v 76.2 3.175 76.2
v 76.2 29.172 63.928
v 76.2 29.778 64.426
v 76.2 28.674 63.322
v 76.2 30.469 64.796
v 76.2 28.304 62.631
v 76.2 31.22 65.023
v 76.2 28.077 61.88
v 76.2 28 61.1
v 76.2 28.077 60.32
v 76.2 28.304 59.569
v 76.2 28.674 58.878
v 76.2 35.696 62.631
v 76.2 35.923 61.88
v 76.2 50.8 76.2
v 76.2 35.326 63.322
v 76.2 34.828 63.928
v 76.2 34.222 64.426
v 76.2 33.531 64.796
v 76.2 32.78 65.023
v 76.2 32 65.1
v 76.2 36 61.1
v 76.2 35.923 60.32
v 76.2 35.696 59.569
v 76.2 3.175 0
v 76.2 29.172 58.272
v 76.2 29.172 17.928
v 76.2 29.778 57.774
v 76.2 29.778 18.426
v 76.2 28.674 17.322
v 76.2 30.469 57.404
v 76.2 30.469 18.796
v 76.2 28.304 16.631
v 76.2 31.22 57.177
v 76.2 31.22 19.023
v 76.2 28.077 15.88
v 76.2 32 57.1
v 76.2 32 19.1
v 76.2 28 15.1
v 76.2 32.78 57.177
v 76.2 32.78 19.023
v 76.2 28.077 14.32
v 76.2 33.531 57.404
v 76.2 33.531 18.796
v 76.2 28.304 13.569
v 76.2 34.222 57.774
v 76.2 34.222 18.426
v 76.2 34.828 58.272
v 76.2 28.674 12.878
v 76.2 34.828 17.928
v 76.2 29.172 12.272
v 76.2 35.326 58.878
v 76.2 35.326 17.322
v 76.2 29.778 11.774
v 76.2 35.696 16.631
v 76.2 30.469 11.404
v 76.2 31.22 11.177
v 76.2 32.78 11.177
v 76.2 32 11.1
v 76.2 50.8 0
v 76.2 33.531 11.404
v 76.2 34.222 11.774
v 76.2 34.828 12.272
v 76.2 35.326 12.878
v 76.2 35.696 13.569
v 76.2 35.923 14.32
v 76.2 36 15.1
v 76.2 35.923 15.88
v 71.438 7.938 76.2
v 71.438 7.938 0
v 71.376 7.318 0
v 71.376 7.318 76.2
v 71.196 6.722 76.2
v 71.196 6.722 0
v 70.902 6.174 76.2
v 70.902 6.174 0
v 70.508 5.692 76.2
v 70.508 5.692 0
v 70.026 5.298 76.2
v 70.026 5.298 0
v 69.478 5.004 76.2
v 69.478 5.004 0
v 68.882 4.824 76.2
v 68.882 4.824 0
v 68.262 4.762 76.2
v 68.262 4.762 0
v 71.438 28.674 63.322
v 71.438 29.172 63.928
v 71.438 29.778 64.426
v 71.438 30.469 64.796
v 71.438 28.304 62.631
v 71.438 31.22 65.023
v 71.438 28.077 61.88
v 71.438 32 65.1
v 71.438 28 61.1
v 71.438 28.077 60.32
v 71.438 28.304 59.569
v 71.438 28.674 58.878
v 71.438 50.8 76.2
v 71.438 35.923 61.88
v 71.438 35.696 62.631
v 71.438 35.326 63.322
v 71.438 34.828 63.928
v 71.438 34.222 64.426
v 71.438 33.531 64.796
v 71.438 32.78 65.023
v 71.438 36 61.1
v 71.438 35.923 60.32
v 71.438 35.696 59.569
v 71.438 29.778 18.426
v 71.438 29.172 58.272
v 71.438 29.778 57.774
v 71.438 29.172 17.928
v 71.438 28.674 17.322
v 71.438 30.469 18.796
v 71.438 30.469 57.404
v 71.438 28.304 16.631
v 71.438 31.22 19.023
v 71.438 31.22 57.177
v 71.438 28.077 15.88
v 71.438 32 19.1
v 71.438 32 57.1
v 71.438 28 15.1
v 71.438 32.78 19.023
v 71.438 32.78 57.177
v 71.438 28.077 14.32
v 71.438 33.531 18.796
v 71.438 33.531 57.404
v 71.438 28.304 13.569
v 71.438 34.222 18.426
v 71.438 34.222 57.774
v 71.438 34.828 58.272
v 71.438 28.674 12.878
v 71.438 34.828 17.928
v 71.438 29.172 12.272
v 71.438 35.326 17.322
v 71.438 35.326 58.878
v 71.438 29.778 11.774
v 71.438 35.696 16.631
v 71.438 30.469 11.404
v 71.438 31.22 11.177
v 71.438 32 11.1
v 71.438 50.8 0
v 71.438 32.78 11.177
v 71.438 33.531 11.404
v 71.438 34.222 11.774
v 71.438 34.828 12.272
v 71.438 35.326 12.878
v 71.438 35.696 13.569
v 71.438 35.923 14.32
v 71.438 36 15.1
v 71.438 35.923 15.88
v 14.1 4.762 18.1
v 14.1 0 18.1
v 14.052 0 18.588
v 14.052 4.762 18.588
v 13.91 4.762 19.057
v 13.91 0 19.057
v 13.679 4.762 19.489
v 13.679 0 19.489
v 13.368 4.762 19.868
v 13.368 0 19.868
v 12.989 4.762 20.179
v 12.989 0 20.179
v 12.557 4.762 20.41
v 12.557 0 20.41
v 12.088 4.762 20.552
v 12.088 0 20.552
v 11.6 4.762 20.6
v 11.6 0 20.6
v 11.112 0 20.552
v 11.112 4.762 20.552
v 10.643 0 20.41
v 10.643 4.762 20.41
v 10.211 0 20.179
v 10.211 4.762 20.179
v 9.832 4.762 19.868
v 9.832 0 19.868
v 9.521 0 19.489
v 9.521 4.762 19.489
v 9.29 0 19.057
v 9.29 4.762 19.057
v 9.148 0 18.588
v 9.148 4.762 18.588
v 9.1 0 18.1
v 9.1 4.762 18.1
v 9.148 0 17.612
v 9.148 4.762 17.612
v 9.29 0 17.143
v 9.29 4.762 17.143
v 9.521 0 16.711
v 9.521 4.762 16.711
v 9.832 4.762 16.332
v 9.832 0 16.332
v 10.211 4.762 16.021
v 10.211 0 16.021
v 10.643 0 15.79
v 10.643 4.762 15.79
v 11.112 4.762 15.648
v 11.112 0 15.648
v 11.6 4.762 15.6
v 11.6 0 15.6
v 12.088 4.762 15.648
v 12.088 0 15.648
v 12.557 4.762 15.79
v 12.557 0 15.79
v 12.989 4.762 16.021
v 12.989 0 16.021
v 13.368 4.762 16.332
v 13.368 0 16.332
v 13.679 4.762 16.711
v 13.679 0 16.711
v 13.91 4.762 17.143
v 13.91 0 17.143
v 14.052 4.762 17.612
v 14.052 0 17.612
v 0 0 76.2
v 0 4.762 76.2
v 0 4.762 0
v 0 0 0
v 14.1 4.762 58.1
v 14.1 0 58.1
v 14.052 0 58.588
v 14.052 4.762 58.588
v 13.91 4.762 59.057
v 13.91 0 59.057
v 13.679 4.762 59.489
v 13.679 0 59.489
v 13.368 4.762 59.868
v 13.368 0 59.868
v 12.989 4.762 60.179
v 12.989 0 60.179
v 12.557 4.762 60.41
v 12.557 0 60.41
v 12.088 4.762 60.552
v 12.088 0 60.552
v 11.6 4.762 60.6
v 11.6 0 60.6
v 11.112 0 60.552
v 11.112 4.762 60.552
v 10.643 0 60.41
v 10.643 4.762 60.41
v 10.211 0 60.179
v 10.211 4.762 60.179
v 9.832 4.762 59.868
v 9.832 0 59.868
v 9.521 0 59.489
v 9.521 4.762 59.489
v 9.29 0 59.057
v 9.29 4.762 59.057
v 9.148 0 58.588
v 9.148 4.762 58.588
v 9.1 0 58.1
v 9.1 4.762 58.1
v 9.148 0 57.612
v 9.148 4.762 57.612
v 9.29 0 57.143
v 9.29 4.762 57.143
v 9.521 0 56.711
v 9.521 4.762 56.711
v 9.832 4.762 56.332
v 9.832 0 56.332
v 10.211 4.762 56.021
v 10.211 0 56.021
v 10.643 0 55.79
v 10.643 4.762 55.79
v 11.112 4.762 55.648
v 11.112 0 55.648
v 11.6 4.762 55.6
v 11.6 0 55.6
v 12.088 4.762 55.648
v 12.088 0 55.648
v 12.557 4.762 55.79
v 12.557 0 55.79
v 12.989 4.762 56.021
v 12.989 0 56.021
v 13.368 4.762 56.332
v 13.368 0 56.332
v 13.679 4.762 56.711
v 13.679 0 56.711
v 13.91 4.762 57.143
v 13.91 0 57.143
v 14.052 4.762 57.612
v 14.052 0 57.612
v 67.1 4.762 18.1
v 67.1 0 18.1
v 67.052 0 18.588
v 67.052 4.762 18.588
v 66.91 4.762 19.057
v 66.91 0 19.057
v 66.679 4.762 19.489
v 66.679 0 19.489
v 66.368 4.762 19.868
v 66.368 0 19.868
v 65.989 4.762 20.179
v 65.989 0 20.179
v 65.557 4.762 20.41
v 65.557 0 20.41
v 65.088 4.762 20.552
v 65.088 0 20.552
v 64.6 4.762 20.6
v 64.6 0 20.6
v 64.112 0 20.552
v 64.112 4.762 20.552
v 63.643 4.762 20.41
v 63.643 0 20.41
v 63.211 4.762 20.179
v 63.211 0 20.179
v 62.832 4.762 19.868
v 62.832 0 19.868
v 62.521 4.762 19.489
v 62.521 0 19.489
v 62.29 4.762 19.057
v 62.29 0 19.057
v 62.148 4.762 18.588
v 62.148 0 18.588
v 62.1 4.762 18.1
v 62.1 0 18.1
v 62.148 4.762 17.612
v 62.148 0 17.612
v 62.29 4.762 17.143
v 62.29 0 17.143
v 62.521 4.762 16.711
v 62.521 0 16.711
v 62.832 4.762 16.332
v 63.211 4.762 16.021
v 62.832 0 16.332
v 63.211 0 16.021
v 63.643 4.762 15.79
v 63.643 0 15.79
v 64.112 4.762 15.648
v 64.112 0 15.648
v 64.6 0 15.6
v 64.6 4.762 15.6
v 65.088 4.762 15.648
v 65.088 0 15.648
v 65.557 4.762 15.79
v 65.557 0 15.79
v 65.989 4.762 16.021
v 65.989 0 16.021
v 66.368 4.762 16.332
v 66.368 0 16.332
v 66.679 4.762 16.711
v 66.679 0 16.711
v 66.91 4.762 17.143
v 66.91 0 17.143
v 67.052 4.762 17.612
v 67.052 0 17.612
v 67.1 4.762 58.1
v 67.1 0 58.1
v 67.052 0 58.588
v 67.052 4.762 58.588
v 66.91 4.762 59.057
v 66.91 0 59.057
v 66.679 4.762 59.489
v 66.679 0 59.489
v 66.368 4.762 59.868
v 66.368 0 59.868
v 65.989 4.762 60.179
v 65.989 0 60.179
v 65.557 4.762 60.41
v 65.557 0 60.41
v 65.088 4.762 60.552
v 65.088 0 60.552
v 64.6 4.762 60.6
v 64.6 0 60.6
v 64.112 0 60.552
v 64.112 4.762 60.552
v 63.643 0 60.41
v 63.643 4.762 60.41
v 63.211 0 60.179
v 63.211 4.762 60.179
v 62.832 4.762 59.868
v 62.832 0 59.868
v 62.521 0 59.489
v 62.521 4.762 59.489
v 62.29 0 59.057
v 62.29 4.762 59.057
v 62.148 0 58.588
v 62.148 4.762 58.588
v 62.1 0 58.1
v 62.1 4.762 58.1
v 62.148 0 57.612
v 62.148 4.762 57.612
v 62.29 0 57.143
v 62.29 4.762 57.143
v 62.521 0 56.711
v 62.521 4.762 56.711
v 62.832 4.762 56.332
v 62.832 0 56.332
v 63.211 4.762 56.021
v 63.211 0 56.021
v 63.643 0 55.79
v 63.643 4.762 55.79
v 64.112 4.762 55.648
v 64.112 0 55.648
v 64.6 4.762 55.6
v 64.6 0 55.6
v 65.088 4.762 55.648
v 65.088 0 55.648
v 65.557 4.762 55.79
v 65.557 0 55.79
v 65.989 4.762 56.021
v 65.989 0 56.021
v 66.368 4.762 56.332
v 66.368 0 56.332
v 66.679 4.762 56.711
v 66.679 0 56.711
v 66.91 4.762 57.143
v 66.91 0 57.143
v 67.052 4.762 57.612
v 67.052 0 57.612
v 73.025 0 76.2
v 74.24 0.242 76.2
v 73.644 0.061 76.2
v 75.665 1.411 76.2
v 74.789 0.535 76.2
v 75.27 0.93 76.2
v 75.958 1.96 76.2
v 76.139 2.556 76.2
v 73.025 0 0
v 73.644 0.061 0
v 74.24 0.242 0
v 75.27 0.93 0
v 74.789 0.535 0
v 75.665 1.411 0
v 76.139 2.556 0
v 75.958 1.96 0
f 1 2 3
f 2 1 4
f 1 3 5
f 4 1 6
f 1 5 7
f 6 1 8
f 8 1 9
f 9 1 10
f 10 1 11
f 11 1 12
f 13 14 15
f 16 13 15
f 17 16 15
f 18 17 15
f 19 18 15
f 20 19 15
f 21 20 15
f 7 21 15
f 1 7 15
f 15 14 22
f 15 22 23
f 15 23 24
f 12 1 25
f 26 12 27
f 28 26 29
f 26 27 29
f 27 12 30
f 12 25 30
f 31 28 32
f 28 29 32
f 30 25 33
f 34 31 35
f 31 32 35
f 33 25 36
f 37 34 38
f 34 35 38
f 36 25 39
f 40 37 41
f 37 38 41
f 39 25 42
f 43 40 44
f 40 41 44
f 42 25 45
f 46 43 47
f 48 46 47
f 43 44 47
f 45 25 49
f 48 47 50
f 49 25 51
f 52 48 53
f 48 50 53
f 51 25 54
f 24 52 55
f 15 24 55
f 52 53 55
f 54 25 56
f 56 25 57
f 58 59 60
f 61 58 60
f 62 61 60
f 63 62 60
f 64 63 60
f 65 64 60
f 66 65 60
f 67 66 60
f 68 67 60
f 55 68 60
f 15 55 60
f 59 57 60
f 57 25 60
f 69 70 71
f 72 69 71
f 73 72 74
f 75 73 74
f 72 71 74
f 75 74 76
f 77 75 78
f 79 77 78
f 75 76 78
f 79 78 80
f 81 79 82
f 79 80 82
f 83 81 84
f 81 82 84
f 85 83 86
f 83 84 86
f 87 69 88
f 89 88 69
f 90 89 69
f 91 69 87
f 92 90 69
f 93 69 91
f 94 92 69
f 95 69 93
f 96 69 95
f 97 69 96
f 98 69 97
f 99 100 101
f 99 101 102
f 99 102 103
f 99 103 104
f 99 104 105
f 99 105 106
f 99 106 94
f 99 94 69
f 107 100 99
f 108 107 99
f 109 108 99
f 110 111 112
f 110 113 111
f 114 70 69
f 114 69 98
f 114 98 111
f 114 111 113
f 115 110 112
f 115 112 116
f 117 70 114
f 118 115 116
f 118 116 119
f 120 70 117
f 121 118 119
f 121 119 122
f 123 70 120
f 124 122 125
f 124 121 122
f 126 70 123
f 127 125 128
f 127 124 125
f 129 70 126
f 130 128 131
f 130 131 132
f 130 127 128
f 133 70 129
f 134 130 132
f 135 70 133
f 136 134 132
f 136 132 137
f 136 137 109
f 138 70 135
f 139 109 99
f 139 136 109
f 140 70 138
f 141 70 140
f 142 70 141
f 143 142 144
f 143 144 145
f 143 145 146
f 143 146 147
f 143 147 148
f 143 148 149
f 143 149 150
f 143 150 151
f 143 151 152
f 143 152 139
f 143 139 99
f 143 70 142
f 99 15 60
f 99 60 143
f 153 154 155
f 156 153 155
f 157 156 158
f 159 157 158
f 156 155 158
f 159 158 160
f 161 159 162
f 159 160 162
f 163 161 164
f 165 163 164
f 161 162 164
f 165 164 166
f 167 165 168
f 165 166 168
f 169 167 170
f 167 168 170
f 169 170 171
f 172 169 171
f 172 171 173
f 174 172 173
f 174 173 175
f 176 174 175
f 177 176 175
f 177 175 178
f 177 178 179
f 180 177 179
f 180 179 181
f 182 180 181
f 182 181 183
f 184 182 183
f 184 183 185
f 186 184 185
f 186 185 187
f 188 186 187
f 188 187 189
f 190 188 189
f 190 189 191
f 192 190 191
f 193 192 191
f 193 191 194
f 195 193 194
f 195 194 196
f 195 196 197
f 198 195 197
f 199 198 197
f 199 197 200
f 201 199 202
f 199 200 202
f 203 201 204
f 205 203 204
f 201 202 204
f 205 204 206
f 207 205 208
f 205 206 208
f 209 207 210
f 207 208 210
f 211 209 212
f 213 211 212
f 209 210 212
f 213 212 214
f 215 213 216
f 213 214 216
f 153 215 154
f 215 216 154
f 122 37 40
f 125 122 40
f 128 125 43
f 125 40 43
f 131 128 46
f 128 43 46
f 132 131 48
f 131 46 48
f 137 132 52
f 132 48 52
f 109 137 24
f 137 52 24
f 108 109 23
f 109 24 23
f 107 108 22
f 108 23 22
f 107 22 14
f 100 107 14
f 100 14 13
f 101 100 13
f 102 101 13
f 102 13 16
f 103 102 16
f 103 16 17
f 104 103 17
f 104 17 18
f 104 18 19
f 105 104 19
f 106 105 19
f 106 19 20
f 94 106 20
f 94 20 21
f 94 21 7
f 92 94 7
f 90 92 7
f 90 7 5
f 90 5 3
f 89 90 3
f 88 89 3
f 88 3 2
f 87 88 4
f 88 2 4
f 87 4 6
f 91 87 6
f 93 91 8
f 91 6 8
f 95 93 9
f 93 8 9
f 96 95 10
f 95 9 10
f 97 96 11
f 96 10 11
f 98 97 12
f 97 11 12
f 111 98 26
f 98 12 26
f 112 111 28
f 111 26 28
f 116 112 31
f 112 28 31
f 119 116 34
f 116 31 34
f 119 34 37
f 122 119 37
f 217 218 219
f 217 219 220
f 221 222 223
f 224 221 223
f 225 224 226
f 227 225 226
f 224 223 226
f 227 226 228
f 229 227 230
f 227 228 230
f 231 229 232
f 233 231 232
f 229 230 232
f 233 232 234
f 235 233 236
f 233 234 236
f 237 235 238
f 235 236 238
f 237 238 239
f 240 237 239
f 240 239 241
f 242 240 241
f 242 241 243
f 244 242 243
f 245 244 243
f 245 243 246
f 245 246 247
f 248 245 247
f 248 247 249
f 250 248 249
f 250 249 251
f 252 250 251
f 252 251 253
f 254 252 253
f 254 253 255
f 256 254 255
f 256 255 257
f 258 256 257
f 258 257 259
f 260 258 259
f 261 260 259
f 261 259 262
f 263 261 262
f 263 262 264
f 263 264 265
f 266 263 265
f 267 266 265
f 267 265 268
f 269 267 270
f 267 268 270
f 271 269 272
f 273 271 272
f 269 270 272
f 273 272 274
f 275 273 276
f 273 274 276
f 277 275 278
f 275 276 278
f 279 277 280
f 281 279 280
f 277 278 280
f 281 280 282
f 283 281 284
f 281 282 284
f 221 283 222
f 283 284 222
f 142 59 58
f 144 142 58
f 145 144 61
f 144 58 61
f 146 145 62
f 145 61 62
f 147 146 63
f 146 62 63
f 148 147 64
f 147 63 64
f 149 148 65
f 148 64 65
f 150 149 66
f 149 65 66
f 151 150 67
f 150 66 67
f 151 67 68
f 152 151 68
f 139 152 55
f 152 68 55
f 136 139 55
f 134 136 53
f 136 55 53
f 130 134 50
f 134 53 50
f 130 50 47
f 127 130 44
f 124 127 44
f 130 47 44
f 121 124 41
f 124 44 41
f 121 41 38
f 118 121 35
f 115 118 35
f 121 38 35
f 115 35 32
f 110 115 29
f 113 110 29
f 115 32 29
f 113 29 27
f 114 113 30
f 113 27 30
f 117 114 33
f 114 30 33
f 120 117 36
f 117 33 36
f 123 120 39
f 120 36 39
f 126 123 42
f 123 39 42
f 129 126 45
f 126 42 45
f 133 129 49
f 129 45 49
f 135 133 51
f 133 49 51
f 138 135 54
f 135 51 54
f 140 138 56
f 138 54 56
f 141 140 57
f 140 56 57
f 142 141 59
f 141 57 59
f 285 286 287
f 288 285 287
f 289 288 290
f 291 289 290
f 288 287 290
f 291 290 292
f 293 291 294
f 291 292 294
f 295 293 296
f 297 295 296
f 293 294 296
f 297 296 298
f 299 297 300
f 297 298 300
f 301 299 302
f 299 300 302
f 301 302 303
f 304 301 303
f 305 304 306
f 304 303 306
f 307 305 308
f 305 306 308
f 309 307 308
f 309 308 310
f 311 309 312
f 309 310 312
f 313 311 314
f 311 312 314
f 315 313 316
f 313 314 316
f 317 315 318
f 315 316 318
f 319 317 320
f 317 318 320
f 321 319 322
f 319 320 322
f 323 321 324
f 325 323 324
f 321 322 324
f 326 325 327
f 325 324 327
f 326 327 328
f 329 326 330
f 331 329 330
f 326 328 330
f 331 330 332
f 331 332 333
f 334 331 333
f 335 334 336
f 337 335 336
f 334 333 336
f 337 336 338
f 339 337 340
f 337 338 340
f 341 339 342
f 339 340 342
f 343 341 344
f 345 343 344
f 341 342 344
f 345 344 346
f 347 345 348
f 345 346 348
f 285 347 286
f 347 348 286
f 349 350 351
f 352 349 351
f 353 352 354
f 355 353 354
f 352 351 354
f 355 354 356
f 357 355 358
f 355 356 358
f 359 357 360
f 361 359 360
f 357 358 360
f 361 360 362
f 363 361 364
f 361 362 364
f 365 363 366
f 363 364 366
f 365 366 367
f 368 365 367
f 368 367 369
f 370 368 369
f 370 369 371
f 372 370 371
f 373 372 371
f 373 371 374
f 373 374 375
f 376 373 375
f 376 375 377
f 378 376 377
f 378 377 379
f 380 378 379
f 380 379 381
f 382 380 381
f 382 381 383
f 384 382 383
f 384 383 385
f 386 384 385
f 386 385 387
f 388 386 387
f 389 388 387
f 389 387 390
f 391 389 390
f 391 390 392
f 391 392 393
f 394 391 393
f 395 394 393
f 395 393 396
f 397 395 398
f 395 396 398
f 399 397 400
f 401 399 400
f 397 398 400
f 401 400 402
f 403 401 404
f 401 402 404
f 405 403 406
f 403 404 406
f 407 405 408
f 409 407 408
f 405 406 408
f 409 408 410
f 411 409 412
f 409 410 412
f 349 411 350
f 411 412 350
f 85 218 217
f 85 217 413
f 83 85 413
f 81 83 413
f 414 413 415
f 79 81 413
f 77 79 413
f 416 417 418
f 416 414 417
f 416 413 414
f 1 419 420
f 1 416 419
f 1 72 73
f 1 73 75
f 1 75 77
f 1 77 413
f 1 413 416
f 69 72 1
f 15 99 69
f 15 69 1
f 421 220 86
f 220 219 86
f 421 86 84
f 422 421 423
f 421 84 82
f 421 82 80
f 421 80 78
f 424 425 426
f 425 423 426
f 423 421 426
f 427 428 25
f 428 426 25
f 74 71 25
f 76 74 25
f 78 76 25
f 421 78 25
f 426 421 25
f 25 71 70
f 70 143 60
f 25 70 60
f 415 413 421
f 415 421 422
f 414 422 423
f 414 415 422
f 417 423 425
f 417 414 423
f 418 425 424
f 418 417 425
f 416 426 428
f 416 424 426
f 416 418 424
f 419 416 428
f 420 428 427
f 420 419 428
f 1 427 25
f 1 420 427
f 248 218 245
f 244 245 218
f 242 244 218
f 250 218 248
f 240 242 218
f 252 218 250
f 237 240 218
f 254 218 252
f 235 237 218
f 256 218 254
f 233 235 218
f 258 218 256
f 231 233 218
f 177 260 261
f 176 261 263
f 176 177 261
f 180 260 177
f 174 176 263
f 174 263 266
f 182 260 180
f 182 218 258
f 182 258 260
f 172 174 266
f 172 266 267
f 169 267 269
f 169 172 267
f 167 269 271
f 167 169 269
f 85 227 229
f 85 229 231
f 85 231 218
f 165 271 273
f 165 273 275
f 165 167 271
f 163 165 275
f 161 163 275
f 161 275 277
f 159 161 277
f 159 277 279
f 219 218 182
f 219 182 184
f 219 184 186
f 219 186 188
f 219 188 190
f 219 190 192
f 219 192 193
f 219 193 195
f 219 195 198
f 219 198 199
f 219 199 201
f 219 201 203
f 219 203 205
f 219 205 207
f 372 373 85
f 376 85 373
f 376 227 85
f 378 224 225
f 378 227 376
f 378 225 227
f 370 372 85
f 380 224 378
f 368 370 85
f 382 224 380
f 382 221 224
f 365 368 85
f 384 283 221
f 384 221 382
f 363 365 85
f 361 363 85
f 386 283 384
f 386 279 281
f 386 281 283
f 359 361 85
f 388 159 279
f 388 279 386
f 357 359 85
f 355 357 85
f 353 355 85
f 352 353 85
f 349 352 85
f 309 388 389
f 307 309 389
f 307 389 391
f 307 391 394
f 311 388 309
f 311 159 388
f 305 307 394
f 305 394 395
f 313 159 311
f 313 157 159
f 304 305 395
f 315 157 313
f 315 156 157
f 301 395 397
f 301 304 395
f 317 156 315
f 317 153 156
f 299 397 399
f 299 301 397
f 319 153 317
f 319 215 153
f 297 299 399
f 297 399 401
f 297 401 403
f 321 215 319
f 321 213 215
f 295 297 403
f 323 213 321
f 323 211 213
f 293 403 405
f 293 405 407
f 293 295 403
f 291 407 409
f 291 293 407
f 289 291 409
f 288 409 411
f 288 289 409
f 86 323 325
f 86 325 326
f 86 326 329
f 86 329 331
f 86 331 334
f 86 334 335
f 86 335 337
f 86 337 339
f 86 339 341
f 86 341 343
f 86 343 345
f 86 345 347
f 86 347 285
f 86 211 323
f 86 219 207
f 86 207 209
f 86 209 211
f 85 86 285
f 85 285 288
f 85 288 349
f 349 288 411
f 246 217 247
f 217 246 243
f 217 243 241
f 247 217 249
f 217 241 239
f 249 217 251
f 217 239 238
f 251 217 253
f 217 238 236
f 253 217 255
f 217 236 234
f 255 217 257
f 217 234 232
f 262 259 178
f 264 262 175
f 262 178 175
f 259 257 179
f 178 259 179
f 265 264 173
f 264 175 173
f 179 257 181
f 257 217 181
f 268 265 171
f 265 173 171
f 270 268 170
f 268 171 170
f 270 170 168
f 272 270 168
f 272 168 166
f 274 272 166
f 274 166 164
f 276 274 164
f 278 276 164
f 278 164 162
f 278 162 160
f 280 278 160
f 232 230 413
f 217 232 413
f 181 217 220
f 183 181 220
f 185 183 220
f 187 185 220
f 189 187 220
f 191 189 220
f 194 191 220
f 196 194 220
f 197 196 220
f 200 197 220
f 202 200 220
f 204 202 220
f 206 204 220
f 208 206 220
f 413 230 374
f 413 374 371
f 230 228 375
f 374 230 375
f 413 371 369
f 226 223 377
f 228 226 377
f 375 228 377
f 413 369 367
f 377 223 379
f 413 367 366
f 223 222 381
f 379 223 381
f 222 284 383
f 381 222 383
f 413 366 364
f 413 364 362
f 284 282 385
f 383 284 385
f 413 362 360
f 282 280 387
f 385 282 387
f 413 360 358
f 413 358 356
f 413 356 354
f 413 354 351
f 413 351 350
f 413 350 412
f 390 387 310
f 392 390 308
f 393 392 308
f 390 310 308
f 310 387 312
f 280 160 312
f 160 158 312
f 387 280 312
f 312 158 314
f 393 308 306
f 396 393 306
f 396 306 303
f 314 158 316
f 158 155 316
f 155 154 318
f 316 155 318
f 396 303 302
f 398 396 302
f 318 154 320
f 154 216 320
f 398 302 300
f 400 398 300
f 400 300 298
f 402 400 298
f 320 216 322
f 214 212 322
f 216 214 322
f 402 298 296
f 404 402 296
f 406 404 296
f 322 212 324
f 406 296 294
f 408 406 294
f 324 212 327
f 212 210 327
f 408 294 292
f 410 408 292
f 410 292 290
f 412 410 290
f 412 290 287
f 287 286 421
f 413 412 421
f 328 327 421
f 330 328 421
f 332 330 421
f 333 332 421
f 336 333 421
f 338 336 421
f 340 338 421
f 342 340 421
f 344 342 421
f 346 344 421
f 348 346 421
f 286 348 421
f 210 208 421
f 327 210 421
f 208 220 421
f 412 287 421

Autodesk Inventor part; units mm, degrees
ref_plane "YZ Plane" through (0, 0, 0) normal (1, 0, 0) x (0, 1, 0)
ref_plane "XZ Plane" through (0, 0, 0) normal (0, 1, 0) x (-1, 0, 0)
ref_plane "XY Plane" through (0, 0, 0) normal (0, 0, 1) x (1, 0, 0)
sketch "Sketch1" plane through (0, 0, 0) normal (0, 0, 1) x (1, 0, 0)
  line L0 (0, 0) -> (76.2, 0)
  line L1 (76.2, 0) -> (76.2, 50.8)
  line L2 (76.2, 50.8) -> (0, 50.8)
  line L3 (0, 50.8) -> (0, 0)
  dimension "d0" = 76.2
  dimension "d1" = 50.8
extrude "Extrusion1" add sketch "Sketch1" along normal blind 76.2
shell "Shell1" thickness 4.7625 removed faces 4 at (50.8, 16.9333, 76.2) at (50.8, 50.8, 25.4) at (50.8, 16.9333, 0) at (0, 33.8667, 25.4)
sketch "Sketch3" plane through (0, 0, 0) normal (0, -1, 0) x (1, 0, 0)
  line L0 (64.6, 58.1) -> (11.6, 58.1) construction
  line L1 (11.6, 58.1) -> (11.6, 18.1) construction
  line L2 (11.6, 18.1) -> (64.6, 18.1) construction
  line L3 (64.6, 18.1) -> (64.6, 58.1) construction
  circle A0 centre (64.6, 18.1) radius 2.5
  circle A1 centre (64.6, 58.1) radius 2.5
  circle A2 centre (11.6, 58.1) radius 2.5
  circle A3 centre (11.6, 18.1) radius 2.5
  line L4 (76.2, 0) -> (76.2, 76.2) construction
  line L5 (0, 76.2) -> (76.2, 76.2) construction
  point P0 (0, 0)
  point P1 (64.6, 38.1)
  point P2 (76.2, 38.1)
  point P3 (38.1, 58.1)
  point P4 (38.1, 76.2)
  dimension "d6" = 40
  dimension "d7" = 53
  dimension "d8" = 5
  dimension "d16" = 0
extrude "Extrusion2" cut sketch "Sketch3" against normal blind 76.2
sketch "Sketch4" plane through (76.2, 0, 0) normal (1, 0, 0) x (0, 0, -1)
  circle A0 centre (-61.1, 32) radius 4
  circle A1 centre (-15.1, 32) radius 4
  line L0 (-61.1, 32) -> (-15.1, 32) construction
  line L1 (0, 0) -> (0, 50.8) construction
  line L2 (0, 50.8) -> (-76.2, 50.8) construction
  line L3 (-76.2, 0) -> (-76.2, 50.8) construction
  line L4 (0, 0) -> (-76.2, 0) construction
  point P0 (-38.1, 32)
  point P1 (0, 25.4)
  point P2 (-38.1, 50.8)
  dimension "d11" = 46
  dimension "d12" = 8
  dimension "d15" = 32
extrude "Extrusion3" cut sketch "Sketch4" against normal blind 76.2
fillet "Fillet1" radius 3.175 2 edges at (76.2, 0, 38.1) (71.4375, 4.7625, 38.1)
equation "\"BendRadius\" = Thickness"
equation "\"BendReliefWidth\" = Thickness"
equation "\"BendReliefDepth\" = 0.5 * Thickness"
equation "\"CornerReliefSize\" = 4 * Thickness"
equation "\"MinimumRemnant\" = 2 * Thickness"
equation "\"TransitionRadius\" = BendRadius"
equation "\"JacobiRadiusSize\" = BendRadius"
equation "\"GapSize\" = Thickness"
equation "\"Thickness\" = 3.048"
properties part number "2x3_L_Bracket"
